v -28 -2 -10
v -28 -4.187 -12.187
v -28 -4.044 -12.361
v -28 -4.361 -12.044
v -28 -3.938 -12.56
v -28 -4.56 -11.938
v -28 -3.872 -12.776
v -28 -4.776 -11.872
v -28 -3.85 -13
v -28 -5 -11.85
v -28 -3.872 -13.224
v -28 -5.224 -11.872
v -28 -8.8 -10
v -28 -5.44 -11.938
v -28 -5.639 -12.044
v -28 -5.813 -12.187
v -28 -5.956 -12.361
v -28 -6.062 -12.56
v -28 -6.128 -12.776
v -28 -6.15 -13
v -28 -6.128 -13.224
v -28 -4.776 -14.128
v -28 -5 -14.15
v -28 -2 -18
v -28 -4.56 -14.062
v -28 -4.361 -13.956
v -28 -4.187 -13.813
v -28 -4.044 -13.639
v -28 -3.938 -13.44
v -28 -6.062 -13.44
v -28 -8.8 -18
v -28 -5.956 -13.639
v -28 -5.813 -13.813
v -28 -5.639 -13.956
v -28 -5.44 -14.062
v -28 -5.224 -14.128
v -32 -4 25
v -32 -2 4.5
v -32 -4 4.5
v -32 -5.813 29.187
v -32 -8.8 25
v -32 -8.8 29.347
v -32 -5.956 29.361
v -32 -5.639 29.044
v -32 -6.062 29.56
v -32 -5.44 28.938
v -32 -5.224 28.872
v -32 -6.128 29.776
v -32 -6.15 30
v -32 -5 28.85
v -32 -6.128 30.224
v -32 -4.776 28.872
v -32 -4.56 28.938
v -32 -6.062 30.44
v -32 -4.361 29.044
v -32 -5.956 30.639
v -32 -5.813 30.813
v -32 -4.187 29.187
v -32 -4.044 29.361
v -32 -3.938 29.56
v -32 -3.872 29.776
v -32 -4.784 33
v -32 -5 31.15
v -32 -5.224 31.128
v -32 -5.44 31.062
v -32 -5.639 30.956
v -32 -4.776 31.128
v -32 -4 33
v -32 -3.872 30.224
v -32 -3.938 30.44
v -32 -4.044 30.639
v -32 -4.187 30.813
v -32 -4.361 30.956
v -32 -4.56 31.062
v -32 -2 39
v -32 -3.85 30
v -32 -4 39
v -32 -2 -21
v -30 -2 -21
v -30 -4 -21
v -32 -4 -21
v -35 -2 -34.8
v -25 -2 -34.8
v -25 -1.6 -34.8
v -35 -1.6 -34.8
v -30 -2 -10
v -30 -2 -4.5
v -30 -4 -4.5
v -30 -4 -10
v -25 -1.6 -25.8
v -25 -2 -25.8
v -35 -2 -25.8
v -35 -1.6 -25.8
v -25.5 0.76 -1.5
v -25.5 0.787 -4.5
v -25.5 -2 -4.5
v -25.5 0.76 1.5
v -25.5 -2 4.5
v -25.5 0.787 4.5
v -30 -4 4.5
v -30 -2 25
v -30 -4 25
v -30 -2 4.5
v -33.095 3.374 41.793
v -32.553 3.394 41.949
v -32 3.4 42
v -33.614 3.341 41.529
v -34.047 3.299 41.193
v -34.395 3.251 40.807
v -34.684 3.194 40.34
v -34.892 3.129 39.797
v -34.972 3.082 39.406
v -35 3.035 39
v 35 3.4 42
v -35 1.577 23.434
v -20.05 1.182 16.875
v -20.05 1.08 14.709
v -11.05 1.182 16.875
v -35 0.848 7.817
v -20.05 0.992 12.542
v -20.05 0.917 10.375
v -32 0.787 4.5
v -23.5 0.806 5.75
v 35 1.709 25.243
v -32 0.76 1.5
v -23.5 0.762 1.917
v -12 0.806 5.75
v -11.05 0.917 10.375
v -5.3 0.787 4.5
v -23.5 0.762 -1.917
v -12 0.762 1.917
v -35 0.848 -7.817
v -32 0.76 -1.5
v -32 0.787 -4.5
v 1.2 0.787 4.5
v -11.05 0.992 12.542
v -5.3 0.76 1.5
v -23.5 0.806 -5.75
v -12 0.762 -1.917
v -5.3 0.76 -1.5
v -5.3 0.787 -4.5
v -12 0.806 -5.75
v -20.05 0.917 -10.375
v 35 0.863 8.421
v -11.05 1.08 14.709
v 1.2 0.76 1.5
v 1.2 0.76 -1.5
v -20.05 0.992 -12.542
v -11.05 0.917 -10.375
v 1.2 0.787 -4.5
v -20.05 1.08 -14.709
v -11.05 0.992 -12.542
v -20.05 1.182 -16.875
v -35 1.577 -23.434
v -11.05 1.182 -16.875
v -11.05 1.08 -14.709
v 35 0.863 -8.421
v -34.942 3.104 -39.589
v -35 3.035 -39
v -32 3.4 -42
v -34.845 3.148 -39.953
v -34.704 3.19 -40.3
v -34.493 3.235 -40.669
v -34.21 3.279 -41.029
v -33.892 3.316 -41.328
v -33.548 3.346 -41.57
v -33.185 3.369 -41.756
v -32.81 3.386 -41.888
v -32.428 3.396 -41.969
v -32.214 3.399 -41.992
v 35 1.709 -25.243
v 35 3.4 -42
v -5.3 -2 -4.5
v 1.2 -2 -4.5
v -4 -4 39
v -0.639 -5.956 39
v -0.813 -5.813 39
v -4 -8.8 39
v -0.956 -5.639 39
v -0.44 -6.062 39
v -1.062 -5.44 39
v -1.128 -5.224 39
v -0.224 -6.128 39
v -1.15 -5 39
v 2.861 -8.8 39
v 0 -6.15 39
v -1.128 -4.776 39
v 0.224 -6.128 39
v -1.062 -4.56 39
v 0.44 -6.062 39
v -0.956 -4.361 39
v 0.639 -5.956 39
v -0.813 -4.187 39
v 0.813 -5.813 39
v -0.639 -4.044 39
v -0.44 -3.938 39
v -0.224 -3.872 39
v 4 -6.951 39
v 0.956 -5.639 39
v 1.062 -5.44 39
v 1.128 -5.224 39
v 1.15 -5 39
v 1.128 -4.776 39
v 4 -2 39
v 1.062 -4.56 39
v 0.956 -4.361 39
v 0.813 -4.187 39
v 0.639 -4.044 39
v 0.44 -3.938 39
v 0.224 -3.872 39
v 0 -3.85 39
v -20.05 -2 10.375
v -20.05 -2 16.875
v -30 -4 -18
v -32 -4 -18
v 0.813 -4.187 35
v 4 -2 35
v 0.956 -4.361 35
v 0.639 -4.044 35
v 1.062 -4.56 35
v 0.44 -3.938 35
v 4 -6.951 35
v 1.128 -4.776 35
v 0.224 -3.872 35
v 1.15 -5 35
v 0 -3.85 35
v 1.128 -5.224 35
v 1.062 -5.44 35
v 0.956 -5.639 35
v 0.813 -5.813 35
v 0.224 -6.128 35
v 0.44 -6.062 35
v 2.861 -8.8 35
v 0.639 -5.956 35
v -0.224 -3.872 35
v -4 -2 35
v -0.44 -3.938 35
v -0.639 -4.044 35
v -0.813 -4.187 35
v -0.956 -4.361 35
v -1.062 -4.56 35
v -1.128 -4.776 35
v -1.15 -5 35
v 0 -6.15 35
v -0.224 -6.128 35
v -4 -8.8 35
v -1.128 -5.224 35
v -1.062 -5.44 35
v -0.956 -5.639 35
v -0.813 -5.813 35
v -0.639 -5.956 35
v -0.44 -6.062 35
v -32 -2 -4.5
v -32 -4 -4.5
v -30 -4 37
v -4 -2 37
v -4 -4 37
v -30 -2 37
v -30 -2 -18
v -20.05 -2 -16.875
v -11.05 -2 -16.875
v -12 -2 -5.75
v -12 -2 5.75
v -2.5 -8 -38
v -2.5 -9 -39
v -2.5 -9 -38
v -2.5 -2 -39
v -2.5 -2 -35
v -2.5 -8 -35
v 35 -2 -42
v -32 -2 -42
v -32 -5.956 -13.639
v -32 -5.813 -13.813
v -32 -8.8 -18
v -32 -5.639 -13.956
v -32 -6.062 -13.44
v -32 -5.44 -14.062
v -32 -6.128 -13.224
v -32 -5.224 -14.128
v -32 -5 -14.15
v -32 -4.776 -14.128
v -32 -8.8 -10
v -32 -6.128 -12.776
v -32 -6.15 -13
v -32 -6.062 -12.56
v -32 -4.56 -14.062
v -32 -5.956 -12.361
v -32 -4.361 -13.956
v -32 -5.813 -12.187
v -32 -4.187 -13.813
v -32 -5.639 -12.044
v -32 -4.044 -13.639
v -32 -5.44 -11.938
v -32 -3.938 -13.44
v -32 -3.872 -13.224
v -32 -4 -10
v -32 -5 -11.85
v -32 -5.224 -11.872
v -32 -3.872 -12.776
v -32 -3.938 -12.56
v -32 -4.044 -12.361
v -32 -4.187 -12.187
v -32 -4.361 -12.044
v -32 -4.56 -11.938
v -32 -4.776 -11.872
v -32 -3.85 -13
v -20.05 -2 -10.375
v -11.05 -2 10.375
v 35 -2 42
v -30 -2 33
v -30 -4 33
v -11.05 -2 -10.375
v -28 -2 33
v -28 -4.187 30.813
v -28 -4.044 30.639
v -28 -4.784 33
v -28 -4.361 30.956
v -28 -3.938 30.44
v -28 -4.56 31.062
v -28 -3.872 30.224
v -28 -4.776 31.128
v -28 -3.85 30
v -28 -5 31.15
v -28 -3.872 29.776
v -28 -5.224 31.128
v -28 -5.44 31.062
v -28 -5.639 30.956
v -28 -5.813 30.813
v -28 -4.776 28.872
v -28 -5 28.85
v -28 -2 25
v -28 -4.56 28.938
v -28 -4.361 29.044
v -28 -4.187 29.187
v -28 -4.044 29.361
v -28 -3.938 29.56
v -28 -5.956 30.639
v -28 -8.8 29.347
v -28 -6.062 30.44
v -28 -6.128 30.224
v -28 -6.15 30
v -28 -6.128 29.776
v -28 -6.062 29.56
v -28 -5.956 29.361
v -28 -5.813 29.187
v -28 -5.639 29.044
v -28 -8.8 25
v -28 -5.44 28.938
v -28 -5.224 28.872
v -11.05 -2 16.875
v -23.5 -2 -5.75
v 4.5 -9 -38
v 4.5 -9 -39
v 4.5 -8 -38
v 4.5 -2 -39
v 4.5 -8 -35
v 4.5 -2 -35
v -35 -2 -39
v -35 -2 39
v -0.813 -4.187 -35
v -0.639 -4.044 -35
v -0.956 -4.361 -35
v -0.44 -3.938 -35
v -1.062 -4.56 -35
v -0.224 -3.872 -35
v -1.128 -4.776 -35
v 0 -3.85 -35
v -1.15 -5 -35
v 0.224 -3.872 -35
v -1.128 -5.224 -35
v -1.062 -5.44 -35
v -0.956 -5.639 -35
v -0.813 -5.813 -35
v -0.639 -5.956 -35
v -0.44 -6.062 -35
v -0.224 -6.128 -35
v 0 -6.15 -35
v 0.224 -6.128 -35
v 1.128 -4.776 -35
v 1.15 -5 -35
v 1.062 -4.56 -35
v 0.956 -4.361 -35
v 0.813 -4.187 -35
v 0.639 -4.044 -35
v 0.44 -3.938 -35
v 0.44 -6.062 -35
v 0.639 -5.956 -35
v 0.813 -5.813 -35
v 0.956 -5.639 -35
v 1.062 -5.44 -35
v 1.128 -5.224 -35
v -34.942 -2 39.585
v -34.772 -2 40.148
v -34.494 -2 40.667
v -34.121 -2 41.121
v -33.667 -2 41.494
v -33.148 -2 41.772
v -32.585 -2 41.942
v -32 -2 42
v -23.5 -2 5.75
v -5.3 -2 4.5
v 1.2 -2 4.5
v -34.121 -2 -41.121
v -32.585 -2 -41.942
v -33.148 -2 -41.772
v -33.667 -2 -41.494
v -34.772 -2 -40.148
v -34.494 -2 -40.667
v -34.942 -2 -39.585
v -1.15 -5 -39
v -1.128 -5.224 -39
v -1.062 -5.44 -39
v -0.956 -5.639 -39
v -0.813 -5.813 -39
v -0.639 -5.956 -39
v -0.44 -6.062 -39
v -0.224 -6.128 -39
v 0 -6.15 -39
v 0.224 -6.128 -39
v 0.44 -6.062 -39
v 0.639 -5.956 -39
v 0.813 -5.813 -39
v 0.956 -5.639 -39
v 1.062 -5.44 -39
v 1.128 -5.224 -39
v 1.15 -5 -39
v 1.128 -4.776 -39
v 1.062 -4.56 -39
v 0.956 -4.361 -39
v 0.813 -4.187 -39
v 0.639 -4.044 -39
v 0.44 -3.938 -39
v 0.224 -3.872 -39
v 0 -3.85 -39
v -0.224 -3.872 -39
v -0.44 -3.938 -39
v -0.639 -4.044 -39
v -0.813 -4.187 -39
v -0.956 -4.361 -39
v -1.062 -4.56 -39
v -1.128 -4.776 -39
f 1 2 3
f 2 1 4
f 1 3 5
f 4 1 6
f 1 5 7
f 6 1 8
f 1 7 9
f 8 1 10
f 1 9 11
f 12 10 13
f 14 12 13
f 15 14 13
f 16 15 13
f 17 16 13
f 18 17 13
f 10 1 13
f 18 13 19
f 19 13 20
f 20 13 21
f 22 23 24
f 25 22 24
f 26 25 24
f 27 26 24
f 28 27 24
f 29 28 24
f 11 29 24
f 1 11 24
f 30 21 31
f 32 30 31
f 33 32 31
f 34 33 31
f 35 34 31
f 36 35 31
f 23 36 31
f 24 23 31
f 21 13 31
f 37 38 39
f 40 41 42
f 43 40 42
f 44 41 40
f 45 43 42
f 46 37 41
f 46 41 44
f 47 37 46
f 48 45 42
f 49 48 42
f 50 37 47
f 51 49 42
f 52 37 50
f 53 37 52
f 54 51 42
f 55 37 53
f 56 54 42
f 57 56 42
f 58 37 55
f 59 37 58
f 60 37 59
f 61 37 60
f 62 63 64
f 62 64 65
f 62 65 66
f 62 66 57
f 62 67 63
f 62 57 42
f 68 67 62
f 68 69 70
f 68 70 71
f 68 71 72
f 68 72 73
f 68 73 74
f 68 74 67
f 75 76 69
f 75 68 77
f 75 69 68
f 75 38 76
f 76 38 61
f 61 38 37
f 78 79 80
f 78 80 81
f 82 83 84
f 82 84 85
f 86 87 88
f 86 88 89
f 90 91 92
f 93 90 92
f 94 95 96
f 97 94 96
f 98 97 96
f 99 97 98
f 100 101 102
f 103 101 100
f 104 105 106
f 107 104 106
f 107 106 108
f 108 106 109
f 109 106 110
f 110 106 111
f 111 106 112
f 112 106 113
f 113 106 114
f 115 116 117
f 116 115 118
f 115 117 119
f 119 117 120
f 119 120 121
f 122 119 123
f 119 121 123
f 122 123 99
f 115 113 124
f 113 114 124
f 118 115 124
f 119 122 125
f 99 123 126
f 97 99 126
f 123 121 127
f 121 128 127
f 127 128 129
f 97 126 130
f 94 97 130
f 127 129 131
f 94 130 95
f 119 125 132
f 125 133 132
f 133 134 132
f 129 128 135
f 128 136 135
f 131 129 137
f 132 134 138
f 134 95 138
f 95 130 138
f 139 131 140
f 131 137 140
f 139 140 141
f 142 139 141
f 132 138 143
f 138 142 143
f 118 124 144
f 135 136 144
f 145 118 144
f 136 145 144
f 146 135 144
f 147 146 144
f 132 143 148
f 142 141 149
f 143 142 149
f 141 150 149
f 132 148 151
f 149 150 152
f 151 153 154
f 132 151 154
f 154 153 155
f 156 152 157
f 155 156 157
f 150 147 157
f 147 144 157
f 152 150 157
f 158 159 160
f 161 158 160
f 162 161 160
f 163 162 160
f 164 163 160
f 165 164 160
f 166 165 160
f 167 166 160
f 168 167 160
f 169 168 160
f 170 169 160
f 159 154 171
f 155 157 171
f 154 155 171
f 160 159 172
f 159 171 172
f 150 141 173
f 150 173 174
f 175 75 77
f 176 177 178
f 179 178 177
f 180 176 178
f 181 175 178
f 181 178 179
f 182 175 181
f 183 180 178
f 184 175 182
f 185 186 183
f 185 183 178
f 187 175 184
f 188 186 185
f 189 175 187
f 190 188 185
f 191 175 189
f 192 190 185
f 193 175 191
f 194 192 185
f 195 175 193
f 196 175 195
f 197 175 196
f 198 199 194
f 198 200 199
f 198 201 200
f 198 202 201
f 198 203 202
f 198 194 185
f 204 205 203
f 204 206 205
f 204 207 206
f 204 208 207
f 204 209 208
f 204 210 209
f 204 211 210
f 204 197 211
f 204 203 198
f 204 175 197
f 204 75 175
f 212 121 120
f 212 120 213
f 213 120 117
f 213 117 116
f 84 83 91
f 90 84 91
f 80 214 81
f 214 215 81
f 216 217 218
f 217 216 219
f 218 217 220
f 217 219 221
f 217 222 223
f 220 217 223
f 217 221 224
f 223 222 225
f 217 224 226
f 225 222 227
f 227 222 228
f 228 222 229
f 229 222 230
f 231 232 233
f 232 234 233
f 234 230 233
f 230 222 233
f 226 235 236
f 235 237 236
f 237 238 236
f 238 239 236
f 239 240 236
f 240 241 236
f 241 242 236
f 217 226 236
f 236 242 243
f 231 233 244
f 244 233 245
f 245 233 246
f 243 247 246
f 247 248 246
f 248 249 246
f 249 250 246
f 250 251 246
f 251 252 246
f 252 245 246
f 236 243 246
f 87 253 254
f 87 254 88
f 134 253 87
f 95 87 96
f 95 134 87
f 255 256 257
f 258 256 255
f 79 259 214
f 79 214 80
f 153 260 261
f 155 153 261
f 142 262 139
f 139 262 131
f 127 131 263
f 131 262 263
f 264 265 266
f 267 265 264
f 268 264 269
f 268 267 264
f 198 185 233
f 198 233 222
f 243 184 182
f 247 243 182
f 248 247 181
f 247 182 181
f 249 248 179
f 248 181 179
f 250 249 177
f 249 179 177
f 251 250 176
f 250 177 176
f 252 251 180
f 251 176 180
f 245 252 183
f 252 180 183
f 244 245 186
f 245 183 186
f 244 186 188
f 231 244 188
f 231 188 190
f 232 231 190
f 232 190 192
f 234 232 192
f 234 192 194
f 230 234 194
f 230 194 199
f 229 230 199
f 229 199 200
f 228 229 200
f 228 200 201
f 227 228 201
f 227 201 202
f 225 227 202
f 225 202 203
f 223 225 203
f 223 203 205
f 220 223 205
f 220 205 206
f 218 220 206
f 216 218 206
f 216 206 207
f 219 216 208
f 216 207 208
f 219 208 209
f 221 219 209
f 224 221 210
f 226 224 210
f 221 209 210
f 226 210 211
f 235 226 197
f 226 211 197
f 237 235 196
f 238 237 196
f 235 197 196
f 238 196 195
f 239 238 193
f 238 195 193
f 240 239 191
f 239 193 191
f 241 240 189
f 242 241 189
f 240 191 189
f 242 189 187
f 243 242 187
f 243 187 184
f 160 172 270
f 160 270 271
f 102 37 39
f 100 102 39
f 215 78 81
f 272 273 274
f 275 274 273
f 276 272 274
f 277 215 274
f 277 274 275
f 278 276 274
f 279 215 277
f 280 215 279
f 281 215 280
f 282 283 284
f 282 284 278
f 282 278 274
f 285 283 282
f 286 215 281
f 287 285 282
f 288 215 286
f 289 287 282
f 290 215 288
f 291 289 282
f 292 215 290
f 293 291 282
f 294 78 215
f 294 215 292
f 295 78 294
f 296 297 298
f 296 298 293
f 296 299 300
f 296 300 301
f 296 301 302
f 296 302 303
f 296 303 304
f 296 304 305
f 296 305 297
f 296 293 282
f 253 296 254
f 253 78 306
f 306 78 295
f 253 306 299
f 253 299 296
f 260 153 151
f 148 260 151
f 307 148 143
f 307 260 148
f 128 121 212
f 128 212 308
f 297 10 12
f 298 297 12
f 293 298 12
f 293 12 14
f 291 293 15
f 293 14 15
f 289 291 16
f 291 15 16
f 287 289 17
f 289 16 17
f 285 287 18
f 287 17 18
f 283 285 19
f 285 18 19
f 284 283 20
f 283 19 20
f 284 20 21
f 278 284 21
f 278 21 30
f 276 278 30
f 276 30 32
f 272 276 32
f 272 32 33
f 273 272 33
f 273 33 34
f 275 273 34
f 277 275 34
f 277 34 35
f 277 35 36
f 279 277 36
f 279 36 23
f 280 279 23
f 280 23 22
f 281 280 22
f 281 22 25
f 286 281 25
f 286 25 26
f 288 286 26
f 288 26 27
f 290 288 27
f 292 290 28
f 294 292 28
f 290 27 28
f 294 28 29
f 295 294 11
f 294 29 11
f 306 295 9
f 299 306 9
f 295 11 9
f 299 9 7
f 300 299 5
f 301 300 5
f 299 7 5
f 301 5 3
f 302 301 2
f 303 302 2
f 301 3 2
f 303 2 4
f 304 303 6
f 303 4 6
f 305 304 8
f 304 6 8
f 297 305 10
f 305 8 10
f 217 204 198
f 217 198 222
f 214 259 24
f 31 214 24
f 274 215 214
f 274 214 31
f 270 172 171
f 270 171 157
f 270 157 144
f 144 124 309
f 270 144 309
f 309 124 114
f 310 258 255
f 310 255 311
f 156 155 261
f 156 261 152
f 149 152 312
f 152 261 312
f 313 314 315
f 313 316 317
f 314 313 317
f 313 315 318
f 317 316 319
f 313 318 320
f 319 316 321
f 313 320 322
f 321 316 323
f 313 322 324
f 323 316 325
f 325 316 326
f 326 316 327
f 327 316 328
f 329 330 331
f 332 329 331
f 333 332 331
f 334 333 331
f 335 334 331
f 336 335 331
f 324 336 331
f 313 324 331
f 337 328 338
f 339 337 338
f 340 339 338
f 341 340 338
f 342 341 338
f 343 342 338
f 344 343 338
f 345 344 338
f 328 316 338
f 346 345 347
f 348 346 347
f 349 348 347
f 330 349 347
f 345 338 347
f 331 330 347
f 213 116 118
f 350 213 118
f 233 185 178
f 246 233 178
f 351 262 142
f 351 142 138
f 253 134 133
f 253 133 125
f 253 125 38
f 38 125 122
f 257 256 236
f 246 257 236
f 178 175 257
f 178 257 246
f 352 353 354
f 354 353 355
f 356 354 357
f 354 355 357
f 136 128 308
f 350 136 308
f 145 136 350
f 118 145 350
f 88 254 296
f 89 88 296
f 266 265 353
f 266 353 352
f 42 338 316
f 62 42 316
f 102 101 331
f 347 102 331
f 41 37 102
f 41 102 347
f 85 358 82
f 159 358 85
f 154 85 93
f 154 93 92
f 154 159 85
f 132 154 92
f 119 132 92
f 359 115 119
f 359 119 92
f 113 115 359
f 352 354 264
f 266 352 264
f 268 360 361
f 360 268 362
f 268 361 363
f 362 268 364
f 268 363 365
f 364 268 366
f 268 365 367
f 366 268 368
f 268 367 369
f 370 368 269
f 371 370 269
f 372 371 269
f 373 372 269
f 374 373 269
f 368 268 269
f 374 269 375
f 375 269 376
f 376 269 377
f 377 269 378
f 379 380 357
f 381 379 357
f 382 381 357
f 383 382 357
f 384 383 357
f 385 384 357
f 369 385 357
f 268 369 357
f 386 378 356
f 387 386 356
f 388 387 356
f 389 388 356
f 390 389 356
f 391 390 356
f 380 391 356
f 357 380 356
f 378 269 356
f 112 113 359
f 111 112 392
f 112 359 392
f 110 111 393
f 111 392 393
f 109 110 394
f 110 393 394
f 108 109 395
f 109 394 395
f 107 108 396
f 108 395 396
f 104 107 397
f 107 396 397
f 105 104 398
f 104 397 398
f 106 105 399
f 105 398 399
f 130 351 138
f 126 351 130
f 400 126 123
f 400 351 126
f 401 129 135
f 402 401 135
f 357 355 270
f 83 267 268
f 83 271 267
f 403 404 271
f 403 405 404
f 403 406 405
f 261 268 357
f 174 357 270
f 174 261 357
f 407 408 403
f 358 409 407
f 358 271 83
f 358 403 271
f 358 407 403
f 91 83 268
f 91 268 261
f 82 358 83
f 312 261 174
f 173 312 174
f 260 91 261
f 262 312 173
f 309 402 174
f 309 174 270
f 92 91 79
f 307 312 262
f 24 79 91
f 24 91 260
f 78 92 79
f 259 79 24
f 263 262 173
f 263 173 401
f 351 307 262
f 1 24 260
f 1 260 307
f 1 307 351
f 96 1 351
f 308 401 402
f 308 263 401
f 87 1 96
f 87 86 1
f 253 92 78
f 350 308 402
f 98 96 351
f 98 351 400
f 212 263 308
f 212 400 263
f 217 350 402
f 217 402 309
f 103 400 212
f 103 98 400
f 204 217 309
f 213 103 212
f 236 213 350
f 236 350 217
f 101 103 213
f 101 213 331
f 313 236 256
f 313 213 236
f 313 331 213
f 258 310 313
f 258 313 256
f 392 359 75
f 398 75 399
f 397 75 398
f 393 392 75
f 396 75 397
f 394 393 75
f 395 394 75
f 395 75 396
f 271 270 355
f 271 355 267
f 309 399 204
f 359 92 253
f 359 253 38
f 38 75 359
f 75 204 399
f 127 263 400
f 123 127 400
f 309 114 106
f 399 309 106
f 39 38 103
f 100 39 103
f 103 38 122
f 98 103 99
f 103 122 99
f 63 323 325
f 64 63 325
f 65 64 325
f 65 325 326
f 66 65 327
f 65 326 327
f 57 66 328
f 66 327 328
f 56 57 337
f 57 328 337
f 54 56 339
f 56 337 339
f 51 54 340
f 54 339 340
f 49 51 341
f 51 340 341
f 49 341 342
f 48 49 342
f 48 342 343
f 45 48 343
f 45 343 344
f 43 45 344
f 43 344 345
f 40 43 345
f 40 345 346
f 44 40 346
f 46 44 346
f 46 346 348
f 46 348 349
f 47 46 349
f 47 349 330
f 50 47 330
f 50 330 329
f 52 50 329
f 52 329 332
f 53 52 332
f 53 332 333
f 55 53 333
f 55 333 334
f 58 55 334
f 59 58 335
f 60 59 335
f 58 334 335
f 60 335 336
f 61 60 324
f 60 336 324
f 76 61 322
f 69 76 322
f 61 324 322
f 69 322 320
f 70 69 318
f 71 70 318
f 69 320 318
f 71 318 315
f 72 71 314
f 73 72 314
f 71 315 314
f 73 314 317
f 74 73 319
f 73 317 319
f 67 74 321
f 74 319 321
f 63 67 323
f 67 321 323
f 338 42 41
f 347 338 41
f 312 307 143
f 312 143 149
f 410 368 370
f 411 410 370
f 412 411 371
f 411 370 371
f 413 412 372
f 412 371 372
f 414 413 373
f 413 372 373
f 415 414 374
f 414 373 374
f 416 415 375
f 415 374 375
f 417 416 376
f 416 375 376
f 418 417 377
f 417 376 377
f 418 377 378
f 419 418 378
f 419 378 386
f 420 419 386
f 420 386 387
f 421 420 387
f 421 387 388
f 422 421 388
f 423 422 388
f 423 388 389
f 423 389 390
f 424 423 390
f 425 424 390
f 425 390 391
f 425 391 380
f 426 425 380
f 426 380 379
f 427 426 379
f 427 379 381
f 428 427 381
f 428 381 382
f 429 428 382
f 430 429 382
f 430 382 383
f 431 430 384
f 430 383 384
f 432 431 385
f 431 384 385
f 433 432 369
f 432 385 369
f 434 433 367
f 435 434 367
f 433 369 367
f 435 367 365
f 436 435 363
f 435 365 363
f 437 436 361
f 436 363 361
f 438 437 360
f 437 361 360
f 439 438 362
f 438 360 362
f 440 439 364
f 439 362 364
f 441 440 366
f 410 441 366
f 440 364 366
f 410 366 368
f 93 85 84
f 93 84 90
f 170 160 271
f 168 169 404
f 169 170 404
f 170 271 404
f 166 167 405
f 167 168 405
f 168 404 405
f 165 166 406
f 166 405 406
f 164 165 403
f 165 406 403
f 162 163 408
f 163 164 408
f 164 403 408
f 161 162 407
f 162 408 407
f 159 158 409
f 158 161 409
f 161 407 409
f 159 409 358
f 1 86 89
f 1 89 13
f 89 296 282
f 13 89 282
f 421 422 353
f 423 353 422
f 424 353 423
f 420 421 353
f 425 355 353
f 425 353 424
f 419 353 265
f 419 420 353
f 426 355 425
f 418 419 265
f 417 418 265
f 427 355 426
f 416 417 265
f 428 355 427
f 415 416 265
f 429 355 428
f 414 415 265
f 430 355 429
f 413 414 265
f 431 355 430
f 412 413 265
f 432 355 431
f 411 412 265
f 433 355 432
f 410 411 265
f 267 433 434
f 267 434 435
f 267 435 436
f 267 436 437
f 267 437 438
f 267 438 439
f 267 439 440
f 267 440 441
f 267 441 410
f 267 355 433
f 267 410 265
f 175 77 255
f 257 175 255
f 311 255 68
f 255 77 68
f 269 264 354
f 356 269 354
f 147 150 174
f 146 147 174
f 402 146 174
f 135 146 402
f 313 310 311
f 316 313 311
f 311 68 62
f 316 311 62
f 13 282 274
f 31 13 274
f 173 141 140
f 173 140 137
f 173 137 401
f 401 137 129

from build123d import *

# Parameters (mm, degrees)
SKETCH009_W             = 84
SKETCH009_H             = 70
PAD002_DEPTH            = 2
SKETCH010_W             = 2
SKETCH010_H             = 7
PAD003_DEPTH            = 2
SKETCH012_W             = 8
SKETCH012_H             = 6.8
PAD004_DEPTH            = 4
SKETCH013_W             = 7
SKETCH013_H             = 6
PAD005_DEPTH            = 4
SKETCH011_W             = 8
SKETCH011_H             = 6.8
PAD006_DEPTH            = 4
SKETCH014_R             = 1.15
POCKET002_DEPTH         = 81.001
SKETCH016_R             = 1.15
POCKET003_DEPTH         = 8.501
SKETCH018_W             = 11.5
SKETCH018_H             = 11.5
POCKET004_DEPTH         = 5
POCKET005_DEPTH         = 5
POCKET006_DEPTH         = 5
SKETCH021_W             = 1
SKETCH021_H             = 7
PAD007_DEPTH            = 1
SKETCH022_W             = 9
SKETCH022_H             = 10
POCKET007_DEPTH         = 0.4
FILLET_R                = 3
BODY002_PITCH_ANGLE     = -90
BODY002_PLACEMENT_ANGLE = 90
PAD001_DEPTH            = 35
SKETCH007_W             = 11.5
SKETCH007_H             = 11.5
POCKET001_DEPTH         = 13
FILLET001_R             = 3
SKETCH025_W             = 6.5
SKETCH025_H             = 9
SKETCH025_W_2           = 9
SKETCH025_H_2           = 6.5
POCKET008_DEPTH         = 8


with BuildPart() as back:
    # Sketch009 → Pad002 (new body)
    with BuildSketch(Plane.XY):
        Rectangle(SKETCH009_W, SKETCH009_H)
    extrude(amount=PAD002_DEPTH)

    # Sketch010 (on Face6 of Pad002) → Pad003 (join)
    with BuildSketch(Plane.XY.offset(2)):
        with Locations((-38, -1)):
            Rectangle(SKETCH010_W, SKETCH010_H)
        Polygon((-21, 32), (39, 32), (39, -4), (37, -4), (37, 30), (-21, 30), align=None)
    extrude(amount=PAD003_DEPTH)

    # Sketch012 (on Face15 of Pad003) → Pad004 (join)
    with BuildSketch(Plane.YZ.offset(39)):
        with Locations((0, 5.4)):
            Rectangle(SKETCH012_W, SKETCH012_H)
    extrude(amount=-PAD004_DEPTH)

    # Sketch013 (on Face9 of Pad004) → Pad005 (join)
    with BuildSketch(Plane(origin=(-39, 0, 0), x_dir=(0, -1, 0), z_dir=(-1, 0, 0))):
        with Locations((1, 5)):
            Rectangle(SKETCH013_W, SKETCH013_H)
    extrude(amount=-PAD005_DEPTH)

    # Sketch011 (on Face16 of Pad003) → Pad006 (join)
    with BuildSketch(Plane(origin=(0, 32, 0), x_dir=(-1, 0, 0), z_dir=(0, 1, 0))):
        with Locations((-29, 5.4)):
            Rectangle(SKETCH011_W, SKETCH011_H)
        with Locations((14, 5.4)):
            Rectangle(SKETCH011_W, SKETCH011_H)
    extrude(amount=-PAD006_DEPTH)

    # Sketch014 (on Face44 of Pad006) → Pocket002 (cut, through all)
    with BuildSketch(Plane.YZ.offset(39)):
        with Locations((0, 5)):
            Circle(SKETCH014_R)
    extrude(amount=-POCKET002_DEPTH, mode=Mode.SUBTRACT)

    # Sketch016 → Pocket003 (cut, through all)
    with BuildSketch(Plane.XZ.offset(-26.5)):
        with Locations((-13, 5)):
            Circle(SKETCH016_R)
        with Locations((30, 5)):
            Circle(SKETCH016_R)
    extrude(amount=-POCKET003_DEPTH, mode=Mode.SUBTRACT)

    # Sketch018 (on Face5 of Pocket003) → Pocket004 (cut)
    with BuildSketch(Plane.XY.offset(2)):
        with Locations((0, 17.75)):
            Rectangle(SKETCH018_W, SKETCH018_H)
    extrude(amount=-POCKET004_DEPTH, mode=Mode.SUBTRACT)

    # Sketch019 (on Face31 of Pocket004) → Pocket005 (cut)
    with BuildSketch(Plane.XZ.offset(-28)):
        Polygon((29.125944, 9.042901), (33.258869, 4.499726), (33.258869, 9.042901), align=None)
    extrude(amount=-POCKET005_DEPTH, mode=Mode.SUBTRACT)

    # Sketch020 (on Face36 of Pocket005) → Pocket006 (cut)
    with BuildSketch(Plane(origin=(35, 0, 0), x_dir=(0, -1, 0), z_dir=(-1, 0, 0))):
        Polygon((2.77547, 8.938441), (6.386171, 3.079567), (6.386171, 8.938441), align=None)
    extrude(amount=-POCKET006_DEPTH, mode=Mode.SUBTRACT)

    # Sketch021 (on Face40 of Pocket006) → Pad007 (join)
    with BuildSketch(Plane.XY.offset(8)):
        with Locations((-38.5, -1)):
            Rectangle(SKETCH021_W, SKETCH021_H)
    extrude(amount=PAD007_DEPTH)

    # Sketch022 (on Face5 of Pocket005) → Pocket007 (cut)
    with BuildSketch(Plane.XY.offset(2)):
        with Locations((-30.3, 30)):
            Rectangle(SKETCH022_W, SKETCH022_H)
    extrude(amount=-POCKET007_DEPTH, mode=Mode.SUBTRACT)

    # Fillet
    fillet_edges = [back.edges().sort_by_distance(p)[0] for p in [
        (42, 35, 1),
        (-42, 35, 1),
    ]]
    fillet(fillet_edges, radius=FILLET_R)


with BuildPart() as back_1:
    # Body002 pitch: moved
    add(back.part.rotate(Axis((0, 0, 0), (0, 1, 0)), BODY002_PITCH_ANGLE))


with BuildPart() as back_2:
    # Body002 placement: moved
    add(back_1.part.rotate(Axis((0, 0, 0), (0, 0, 1)), BODY002_PLACEMENT_ANGLE))


with BuildPart() as curve:
    # Sketch006 → Pad001 (new body, symmetric)
    with BuildSketch(Plane(origin=(0, 0, 0), x_dir=(0, 0, -1), z_dir=(1, 0, 0))):
        with BuildLine():
            ThreePointArc((-42, 3.4), (0, 0.756736), (42, 3.4))
            Line((42, -0.1), (42, 3.4))
            Line((-42, -0.1), (42, -0.1))
            Line((-42, 3.4), (-42, -0.1))
        make_face()
    extrude(amount=PAD001_DEPTH, both=True)

    # Sketch007 (on Face3 of Pad001) → Pocket001 (cut)
    with BuildSketch(Plane.XZ.offset(0.1)):
        with Locations((-17.75, 0)):
            Rectangle(SKETCH007_W, SKETCH007_H)
    extrude(amount=-POCKET001_DEPTH, mode=Mode.SUBTRACT)

    # Fillet001
    fillet001_edges = [curve.edges().sort_by_distance(p)[0] for p in [
        (-35, 1.65, -42),
        (-35, 1.65, 42),
    ]]
    fillet(fillet001_edges, radius=FILLET001_R)

    # Boolean: union Back
    add(back_2.part)

    # Sketch025 (on Face32 of Boolean) → Pocket008 (cut, symmetric)
    with BuildSketch(Plane.XZ.offset(2)):
        with Locations((-28.75, 0)):
            Rectangle(SKETCH025_W, SKETCH025_H)
        with Locations((-15.55, 13.625)):
            Rectangle(SKETCH025_W_2, SKETCH025_H_2)
        with Locations((-2.05, 0)):
            Rectangle(SKETCH025_W, SKETCH025_H)
        with Locations((-15.55, -13.625)):
            Rectangle(SKETCH025_W_2, SKETCH025_H_2)
    extrude(amount=POCKET008_DEPTH, both=True, mode=Mode.SUBTRACT)


solid = curve.part
